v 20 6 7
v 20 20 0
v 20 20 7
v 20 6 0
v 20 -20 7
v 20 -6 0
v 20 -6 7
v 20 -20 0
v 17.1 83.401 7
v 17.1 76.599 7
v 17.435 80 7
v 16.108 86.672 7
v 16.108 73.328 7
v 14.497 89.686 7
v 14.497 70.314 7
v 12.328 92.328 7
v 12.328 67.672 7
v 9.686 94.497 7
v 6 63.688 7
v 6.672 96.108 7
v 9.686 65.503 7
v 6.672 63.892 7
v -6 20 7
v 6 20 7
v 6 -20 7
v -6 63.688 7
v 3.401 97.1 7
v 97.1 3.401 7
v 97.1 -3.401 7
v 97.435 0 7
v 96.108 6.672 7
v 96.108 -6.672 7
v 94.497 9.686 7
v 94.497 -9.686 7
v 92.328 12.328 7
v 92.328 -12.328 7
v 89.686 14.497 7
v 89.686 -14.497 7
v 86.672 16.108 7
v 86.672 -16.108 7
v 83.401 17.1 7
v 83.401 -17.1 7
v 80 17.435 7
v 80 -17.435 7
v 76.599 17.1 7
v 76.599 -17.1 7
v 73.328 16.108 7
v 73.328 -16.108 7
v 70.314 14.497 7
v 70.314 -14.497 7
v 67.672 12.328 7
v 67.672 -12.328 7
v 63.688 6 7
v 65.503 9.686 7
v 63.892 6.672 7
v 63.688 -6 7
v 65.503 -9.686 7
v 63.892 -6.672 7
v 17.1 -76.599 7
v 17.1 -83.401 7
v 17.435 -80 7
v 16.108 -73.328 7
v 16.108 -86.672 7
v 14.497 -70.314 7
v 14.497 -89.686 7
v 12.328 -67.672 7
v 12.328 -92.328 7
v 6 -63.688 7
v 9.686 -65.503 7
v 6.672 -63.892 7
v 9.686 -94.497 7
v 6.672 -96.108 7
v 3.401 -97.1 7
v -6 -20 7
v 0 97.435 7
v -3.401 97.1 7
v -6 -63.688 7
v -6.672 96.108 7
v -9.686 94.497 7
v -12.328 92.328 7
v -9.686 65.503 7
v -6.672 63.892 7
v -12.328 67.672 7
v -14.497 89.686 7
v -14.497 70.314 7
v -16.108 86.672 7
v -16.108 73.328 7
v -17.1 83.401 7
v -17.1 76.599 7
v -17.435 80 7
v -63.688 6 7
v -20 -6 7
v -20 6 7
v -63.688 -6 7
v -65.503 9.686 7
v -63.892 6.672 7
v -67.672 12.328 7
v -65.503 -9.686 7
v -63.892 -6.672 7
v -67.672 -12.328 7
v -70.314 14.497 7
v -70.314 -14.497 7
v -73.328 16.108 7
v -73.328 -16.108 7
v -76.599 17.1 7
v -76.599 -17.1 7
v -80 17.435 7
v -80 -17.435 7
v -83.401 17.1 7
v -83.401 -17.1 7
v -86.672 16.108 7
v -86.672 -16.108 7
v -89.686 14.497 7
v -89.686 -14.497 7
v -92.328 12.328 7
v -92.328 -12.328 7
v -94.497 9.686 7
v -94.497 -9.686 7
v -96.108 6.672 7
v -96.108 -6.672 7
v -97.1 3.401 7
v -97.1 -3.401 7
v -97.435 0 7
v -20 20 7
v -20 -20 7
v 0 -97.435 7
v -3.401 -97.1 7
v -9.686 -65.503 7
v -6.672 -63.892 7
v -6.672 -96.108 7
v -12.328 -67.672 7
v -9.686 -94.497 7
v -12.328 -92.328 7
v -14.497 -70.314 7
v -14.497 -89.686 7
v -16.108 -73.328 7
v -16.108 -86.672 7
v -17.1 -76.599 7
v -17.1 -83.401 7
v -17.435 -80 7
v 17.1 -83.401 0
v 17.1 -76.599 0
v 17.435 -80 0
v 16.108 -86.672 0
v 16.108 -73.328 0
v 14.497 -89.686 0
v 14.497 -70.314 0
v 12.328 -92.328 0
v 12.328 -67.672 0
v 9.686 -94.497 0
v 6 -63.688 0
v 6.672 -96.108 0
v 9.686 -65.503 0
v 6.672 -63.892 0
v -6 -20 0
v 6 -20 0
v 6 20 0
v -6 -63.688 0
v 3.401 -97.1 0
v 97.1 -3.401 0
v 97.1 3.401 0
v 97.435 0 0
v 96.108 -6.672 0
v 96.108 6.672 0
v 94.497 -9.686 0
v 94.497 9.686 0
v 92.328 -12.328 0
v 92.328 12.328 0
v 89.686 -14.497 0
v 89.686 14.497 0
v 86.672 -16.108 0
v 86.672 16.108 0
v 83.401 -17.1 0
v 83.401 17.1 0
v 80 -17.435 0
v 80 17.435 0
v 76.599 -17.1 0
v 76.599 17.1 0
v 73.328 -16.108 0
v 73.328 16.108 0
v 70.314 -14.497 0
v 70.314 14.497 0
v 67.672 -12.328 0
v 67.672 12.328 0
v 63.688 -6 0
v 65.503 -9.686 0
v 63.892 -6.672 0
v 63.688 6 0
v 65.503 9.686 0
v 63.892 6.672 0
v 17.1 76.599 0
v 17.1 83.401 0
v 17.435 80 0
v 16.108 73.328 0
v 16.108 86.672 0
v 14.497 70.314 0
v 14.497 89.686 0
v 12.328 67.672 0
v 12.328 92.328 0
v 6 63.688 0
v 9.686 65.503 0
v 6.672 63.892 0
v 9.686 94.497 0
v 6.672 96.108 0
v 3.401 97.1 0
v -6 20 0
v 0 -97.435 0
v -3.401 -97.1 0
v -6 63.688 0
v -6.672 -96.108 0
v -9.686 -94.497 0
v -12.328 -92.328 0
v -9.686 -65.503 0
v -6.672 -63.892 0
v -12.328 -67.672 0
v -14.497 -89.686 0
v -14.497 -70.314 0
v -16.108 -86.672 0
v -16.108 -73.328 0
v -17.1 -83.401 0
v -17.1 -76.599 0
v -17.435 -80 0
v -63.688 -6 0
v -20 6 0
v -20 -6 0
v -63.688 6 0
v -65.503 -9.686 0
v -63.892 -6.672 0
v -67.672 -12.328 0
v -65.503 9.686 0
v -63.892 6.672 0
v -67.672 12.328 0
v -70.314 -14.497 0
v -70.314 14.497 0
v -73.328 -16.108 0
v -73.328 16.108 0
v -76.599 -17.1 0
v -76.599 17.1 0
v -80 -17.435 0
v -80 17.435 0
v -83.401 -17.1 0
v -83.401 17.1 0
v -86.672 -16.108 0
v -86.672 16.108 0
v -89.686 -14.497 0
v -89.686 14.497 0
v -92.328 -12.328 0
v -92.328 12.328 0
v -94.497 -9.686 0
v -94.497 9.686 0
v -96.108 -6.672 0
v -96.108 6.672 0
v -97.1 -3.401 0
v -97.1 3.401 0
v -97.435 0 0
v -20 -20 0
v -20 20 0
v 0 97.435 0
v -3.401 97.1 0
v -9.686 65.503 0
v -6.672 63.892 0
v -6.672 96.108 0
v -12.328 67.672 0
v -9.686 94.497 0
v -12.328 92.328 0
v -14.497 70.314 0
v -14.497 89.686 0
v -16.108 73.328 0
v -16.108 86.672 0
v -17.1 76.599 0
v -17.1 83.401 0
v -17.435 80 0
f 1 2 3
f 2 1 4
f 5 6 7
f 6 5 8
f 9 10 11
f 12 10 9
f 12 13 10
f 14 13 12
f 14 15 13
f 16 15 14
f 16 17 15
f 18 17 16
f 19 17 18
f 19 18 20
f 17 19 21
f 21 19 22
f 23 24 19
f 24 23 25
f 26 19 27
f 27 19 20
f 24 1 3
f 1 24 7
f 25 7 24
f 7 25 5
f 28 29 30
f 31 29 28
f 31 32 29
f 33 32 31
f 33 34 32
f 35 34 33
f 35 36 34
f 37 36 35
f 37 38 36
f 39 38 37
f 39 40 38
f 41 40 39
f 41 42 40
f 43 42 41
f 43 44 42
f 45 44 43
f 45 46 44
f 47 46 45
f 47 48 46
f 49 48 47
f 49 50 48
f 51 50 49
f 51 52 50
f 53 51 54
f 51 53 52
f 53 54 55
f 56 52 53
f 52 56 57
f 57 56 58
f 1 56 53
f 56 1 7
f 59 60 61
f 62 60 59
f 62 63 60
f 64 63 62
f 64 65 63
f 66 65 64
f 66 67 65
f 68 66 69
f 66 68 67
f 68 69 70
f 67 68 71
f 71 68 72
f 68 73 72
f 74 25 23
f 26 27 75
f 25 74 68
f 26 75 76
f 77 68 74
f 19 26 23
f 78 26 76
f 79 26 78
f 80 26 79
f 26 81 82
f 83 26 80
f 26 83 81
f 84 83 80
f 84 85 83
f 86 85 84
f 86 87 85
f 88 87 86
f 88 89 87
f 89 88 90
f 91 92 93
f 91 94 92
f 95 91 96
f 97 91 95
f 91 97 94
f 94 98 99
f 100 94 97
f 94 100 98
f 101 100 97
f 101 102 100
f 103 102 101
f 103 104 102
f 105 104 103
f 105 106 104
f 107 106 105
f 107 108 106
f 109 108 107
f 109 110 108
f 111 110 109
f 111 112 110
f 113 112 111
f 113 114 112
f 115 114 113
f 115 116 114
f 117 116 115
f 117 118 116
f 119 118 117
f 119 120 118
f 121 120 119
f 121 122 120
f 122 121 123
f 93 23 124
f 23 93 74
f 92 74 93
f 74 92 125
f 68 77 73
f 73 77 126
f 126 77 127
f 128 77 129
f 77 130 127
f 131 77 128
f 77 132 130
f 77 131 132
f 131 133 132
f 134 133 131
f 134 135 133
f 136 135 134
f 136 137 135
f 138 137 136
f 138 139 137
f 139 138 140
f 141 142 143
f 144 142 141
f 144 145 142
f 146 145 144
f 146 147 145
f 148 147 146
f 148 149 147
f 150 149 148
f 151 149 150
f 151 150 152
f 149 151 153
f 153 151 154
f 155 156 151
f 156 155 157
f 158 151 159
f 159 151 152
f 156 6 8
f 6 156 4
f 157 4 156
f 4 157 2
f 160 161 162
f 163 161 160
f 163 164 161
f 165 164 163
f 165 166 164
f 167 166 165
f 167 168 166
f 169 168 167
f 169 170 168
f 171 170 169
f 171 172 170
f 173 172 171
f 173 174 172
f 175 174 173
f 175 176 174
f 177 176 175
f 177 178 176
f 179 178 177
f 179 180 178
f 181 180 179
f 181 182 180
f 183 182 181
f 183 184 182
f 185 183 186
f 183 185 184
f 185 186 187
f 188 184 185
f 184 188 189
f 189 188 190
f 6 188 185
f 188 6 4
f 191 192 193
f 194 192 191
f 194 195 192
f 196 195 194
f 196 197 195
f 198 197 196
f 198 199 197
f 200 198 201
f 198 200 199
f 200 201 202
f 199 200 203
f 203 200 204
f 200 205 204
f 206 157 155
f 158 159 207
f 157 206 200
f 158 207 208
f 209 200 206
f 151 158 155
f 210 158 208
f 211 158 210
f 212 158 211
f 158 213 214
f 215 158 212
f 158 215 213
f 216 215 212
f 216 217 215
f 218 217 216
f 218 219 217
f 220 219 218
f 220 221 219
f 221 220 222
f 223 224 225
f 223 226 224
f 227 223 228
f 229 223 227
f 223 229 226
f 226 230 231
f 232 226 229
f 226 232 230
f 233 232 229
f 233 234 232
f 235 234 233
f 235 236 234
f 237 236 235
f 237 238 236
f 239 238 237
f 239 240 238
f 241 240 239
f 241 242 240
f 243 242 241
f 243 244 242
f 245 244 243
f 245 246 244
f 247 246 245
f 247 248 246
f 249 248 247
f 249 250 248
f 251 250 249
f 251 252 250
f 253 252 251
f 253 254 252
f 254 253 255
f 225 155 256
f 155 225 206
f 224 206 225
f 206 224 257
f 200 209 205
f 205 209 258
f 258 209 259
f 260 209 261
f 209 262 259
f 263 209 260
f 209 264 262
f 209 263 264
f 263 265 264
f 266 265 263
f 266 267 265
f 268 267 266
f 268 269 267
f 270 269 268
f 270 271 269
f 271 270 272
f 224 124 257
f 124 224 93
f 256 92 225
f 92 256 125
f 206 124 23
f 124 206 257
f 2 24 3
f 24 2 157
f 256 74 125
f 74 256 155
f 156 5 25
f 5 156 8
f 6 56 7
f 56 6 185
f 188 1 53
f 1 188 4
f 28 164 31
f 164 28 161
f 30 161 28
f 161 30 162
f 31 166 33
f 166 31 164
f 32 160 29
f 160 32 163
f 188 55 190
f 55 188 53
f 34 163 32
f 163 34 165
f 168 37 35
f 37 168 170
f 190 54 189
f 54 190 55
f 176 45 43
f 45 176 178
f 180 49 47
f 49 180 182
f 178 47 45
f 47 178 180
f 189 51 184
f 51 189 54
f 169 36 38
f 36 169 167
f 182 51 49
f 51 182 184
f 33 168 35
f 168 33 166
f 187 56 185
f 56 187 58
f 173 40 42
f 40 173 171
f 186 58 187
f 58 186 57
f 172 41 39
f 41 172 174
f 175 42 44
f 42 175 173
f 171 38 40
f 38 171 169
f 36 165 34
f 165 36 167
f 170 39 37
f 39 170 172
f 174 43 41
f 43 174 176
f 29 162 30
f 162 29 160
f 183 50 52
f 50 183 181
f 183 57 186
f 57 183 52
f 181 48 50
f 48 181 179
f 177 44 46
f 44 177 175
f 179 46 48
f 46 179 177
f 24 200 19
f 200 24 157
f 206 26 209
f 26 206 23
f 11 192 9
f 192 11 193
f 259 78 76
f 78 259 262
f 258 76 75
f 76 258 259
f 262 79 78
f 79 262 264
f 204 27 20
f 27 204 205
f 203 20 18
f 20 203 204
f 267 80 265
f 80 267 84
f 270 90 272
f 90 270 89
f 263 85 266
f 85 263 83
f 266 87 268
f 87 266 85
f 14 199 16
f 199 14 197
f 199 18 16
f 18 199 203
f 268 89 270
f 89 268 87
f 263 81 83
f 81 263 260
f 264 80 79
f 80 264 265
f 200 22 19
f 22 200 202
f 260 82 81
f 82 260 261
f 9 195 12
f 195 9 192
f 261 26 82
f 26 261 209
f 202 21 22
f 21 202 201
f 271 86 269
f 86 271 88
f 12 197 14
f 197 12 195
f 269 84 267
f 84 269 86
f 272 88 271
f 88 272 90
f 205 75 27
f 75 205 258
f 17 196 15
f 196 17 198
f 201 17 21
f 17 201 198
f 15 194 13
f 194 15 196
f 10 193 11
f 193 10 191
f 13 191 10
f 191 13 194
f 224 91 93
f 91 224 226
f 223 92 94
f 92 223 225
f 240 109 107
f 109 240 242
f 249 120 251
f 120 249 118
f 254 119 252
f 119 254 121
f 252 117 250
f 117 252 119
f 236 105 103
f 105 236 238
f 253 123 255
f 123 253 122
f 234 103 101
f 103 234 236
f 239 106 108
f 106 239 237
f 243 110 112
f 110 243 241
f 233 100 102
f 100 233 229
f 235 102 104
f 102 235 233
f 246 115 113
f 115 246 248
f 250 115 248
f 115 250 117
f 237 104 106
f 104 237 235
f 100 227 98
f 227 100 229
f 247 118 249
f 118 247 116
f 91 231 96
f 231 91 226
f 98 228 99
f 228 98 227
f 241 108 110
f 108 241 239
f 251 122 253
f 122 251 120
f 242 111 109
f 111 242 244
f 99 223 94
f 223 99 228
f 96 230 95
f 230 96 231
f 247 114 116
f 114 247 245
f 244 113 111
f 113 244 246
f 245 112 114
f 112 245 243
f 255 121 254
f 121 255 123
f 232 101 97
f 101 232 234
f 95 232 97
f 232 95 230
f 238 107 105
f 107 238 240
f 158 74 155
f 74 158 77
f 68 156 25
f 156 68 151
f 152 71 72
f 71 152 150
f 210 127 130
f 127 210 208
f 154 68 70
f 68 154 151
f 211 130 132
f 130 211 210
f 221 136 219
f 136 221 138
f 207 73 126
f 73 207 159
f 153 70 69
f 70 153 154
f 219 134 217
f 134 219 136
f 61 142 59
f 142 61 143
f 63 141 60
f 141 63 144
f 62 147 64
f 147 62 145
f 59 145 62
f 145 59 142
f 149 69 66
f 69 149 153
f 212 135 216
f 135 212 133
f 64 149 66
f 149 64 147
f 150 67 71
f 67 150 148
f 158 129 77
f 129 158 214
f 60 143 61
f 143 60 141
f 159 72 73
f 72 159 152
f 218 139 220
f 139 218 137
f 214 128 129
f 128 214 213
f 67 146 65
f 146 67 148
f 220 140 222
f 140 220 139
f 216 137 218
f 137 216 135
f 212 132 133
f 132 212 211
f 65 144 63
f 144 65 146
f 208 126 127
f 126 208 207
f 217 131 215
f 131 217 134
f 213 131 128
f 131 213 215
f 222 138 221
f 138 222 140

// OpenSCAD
$fn = 32;

// ----------------------------------------------------------------------
// Quadcopter frame: 194.88 mm across the motor pads, arms 80 mm
// ----------------------------------------------------------------------

// --- parameters (mm) ---
hub = 40;                 // central plate size
plate_t = 7;              // plate thickness
arm_len = 80;             // hub centre to motor pad centre
bar_w = 12;               // arm width
pad_d = 34.87;            // motor pad diameter

module arm_bar() {
  /* flat bar: hull of a stub inside the hub and a box at the pad */
  hull() {
    translate([hub / 4, 0, plate_t / 2]) cube([bar_w, bar_w, plate_t], center = true);
    translate([arm_len, 0, plate_t / 2]) cube([bar_w, bar_w, plate_t], center = true);
  }
}

module pad() {
  translate([arm_len, 0, 0]) cylinder(h = plate_t, d = pad_d);
}

module frame() {
  translate([-hub / 2, -hub / 2, 0]) cube([hub, hub, plate_t]);
  rotate([0, 0, 0]) arm_bar();
  rotate([0, 0, 0]) pad();
  rotate([0, 0, 90]) arm_bar();
  rotate([0, 0, 90]) pad();
  rotate([0, 0, 180]) arm_bar();
  rotate([0, 0, 180]) pad();
  rotate([0, 0, 270]) arm_bar();
  rotate([0, 0, 270]) pad();
}

difference() {
  frame();
}
